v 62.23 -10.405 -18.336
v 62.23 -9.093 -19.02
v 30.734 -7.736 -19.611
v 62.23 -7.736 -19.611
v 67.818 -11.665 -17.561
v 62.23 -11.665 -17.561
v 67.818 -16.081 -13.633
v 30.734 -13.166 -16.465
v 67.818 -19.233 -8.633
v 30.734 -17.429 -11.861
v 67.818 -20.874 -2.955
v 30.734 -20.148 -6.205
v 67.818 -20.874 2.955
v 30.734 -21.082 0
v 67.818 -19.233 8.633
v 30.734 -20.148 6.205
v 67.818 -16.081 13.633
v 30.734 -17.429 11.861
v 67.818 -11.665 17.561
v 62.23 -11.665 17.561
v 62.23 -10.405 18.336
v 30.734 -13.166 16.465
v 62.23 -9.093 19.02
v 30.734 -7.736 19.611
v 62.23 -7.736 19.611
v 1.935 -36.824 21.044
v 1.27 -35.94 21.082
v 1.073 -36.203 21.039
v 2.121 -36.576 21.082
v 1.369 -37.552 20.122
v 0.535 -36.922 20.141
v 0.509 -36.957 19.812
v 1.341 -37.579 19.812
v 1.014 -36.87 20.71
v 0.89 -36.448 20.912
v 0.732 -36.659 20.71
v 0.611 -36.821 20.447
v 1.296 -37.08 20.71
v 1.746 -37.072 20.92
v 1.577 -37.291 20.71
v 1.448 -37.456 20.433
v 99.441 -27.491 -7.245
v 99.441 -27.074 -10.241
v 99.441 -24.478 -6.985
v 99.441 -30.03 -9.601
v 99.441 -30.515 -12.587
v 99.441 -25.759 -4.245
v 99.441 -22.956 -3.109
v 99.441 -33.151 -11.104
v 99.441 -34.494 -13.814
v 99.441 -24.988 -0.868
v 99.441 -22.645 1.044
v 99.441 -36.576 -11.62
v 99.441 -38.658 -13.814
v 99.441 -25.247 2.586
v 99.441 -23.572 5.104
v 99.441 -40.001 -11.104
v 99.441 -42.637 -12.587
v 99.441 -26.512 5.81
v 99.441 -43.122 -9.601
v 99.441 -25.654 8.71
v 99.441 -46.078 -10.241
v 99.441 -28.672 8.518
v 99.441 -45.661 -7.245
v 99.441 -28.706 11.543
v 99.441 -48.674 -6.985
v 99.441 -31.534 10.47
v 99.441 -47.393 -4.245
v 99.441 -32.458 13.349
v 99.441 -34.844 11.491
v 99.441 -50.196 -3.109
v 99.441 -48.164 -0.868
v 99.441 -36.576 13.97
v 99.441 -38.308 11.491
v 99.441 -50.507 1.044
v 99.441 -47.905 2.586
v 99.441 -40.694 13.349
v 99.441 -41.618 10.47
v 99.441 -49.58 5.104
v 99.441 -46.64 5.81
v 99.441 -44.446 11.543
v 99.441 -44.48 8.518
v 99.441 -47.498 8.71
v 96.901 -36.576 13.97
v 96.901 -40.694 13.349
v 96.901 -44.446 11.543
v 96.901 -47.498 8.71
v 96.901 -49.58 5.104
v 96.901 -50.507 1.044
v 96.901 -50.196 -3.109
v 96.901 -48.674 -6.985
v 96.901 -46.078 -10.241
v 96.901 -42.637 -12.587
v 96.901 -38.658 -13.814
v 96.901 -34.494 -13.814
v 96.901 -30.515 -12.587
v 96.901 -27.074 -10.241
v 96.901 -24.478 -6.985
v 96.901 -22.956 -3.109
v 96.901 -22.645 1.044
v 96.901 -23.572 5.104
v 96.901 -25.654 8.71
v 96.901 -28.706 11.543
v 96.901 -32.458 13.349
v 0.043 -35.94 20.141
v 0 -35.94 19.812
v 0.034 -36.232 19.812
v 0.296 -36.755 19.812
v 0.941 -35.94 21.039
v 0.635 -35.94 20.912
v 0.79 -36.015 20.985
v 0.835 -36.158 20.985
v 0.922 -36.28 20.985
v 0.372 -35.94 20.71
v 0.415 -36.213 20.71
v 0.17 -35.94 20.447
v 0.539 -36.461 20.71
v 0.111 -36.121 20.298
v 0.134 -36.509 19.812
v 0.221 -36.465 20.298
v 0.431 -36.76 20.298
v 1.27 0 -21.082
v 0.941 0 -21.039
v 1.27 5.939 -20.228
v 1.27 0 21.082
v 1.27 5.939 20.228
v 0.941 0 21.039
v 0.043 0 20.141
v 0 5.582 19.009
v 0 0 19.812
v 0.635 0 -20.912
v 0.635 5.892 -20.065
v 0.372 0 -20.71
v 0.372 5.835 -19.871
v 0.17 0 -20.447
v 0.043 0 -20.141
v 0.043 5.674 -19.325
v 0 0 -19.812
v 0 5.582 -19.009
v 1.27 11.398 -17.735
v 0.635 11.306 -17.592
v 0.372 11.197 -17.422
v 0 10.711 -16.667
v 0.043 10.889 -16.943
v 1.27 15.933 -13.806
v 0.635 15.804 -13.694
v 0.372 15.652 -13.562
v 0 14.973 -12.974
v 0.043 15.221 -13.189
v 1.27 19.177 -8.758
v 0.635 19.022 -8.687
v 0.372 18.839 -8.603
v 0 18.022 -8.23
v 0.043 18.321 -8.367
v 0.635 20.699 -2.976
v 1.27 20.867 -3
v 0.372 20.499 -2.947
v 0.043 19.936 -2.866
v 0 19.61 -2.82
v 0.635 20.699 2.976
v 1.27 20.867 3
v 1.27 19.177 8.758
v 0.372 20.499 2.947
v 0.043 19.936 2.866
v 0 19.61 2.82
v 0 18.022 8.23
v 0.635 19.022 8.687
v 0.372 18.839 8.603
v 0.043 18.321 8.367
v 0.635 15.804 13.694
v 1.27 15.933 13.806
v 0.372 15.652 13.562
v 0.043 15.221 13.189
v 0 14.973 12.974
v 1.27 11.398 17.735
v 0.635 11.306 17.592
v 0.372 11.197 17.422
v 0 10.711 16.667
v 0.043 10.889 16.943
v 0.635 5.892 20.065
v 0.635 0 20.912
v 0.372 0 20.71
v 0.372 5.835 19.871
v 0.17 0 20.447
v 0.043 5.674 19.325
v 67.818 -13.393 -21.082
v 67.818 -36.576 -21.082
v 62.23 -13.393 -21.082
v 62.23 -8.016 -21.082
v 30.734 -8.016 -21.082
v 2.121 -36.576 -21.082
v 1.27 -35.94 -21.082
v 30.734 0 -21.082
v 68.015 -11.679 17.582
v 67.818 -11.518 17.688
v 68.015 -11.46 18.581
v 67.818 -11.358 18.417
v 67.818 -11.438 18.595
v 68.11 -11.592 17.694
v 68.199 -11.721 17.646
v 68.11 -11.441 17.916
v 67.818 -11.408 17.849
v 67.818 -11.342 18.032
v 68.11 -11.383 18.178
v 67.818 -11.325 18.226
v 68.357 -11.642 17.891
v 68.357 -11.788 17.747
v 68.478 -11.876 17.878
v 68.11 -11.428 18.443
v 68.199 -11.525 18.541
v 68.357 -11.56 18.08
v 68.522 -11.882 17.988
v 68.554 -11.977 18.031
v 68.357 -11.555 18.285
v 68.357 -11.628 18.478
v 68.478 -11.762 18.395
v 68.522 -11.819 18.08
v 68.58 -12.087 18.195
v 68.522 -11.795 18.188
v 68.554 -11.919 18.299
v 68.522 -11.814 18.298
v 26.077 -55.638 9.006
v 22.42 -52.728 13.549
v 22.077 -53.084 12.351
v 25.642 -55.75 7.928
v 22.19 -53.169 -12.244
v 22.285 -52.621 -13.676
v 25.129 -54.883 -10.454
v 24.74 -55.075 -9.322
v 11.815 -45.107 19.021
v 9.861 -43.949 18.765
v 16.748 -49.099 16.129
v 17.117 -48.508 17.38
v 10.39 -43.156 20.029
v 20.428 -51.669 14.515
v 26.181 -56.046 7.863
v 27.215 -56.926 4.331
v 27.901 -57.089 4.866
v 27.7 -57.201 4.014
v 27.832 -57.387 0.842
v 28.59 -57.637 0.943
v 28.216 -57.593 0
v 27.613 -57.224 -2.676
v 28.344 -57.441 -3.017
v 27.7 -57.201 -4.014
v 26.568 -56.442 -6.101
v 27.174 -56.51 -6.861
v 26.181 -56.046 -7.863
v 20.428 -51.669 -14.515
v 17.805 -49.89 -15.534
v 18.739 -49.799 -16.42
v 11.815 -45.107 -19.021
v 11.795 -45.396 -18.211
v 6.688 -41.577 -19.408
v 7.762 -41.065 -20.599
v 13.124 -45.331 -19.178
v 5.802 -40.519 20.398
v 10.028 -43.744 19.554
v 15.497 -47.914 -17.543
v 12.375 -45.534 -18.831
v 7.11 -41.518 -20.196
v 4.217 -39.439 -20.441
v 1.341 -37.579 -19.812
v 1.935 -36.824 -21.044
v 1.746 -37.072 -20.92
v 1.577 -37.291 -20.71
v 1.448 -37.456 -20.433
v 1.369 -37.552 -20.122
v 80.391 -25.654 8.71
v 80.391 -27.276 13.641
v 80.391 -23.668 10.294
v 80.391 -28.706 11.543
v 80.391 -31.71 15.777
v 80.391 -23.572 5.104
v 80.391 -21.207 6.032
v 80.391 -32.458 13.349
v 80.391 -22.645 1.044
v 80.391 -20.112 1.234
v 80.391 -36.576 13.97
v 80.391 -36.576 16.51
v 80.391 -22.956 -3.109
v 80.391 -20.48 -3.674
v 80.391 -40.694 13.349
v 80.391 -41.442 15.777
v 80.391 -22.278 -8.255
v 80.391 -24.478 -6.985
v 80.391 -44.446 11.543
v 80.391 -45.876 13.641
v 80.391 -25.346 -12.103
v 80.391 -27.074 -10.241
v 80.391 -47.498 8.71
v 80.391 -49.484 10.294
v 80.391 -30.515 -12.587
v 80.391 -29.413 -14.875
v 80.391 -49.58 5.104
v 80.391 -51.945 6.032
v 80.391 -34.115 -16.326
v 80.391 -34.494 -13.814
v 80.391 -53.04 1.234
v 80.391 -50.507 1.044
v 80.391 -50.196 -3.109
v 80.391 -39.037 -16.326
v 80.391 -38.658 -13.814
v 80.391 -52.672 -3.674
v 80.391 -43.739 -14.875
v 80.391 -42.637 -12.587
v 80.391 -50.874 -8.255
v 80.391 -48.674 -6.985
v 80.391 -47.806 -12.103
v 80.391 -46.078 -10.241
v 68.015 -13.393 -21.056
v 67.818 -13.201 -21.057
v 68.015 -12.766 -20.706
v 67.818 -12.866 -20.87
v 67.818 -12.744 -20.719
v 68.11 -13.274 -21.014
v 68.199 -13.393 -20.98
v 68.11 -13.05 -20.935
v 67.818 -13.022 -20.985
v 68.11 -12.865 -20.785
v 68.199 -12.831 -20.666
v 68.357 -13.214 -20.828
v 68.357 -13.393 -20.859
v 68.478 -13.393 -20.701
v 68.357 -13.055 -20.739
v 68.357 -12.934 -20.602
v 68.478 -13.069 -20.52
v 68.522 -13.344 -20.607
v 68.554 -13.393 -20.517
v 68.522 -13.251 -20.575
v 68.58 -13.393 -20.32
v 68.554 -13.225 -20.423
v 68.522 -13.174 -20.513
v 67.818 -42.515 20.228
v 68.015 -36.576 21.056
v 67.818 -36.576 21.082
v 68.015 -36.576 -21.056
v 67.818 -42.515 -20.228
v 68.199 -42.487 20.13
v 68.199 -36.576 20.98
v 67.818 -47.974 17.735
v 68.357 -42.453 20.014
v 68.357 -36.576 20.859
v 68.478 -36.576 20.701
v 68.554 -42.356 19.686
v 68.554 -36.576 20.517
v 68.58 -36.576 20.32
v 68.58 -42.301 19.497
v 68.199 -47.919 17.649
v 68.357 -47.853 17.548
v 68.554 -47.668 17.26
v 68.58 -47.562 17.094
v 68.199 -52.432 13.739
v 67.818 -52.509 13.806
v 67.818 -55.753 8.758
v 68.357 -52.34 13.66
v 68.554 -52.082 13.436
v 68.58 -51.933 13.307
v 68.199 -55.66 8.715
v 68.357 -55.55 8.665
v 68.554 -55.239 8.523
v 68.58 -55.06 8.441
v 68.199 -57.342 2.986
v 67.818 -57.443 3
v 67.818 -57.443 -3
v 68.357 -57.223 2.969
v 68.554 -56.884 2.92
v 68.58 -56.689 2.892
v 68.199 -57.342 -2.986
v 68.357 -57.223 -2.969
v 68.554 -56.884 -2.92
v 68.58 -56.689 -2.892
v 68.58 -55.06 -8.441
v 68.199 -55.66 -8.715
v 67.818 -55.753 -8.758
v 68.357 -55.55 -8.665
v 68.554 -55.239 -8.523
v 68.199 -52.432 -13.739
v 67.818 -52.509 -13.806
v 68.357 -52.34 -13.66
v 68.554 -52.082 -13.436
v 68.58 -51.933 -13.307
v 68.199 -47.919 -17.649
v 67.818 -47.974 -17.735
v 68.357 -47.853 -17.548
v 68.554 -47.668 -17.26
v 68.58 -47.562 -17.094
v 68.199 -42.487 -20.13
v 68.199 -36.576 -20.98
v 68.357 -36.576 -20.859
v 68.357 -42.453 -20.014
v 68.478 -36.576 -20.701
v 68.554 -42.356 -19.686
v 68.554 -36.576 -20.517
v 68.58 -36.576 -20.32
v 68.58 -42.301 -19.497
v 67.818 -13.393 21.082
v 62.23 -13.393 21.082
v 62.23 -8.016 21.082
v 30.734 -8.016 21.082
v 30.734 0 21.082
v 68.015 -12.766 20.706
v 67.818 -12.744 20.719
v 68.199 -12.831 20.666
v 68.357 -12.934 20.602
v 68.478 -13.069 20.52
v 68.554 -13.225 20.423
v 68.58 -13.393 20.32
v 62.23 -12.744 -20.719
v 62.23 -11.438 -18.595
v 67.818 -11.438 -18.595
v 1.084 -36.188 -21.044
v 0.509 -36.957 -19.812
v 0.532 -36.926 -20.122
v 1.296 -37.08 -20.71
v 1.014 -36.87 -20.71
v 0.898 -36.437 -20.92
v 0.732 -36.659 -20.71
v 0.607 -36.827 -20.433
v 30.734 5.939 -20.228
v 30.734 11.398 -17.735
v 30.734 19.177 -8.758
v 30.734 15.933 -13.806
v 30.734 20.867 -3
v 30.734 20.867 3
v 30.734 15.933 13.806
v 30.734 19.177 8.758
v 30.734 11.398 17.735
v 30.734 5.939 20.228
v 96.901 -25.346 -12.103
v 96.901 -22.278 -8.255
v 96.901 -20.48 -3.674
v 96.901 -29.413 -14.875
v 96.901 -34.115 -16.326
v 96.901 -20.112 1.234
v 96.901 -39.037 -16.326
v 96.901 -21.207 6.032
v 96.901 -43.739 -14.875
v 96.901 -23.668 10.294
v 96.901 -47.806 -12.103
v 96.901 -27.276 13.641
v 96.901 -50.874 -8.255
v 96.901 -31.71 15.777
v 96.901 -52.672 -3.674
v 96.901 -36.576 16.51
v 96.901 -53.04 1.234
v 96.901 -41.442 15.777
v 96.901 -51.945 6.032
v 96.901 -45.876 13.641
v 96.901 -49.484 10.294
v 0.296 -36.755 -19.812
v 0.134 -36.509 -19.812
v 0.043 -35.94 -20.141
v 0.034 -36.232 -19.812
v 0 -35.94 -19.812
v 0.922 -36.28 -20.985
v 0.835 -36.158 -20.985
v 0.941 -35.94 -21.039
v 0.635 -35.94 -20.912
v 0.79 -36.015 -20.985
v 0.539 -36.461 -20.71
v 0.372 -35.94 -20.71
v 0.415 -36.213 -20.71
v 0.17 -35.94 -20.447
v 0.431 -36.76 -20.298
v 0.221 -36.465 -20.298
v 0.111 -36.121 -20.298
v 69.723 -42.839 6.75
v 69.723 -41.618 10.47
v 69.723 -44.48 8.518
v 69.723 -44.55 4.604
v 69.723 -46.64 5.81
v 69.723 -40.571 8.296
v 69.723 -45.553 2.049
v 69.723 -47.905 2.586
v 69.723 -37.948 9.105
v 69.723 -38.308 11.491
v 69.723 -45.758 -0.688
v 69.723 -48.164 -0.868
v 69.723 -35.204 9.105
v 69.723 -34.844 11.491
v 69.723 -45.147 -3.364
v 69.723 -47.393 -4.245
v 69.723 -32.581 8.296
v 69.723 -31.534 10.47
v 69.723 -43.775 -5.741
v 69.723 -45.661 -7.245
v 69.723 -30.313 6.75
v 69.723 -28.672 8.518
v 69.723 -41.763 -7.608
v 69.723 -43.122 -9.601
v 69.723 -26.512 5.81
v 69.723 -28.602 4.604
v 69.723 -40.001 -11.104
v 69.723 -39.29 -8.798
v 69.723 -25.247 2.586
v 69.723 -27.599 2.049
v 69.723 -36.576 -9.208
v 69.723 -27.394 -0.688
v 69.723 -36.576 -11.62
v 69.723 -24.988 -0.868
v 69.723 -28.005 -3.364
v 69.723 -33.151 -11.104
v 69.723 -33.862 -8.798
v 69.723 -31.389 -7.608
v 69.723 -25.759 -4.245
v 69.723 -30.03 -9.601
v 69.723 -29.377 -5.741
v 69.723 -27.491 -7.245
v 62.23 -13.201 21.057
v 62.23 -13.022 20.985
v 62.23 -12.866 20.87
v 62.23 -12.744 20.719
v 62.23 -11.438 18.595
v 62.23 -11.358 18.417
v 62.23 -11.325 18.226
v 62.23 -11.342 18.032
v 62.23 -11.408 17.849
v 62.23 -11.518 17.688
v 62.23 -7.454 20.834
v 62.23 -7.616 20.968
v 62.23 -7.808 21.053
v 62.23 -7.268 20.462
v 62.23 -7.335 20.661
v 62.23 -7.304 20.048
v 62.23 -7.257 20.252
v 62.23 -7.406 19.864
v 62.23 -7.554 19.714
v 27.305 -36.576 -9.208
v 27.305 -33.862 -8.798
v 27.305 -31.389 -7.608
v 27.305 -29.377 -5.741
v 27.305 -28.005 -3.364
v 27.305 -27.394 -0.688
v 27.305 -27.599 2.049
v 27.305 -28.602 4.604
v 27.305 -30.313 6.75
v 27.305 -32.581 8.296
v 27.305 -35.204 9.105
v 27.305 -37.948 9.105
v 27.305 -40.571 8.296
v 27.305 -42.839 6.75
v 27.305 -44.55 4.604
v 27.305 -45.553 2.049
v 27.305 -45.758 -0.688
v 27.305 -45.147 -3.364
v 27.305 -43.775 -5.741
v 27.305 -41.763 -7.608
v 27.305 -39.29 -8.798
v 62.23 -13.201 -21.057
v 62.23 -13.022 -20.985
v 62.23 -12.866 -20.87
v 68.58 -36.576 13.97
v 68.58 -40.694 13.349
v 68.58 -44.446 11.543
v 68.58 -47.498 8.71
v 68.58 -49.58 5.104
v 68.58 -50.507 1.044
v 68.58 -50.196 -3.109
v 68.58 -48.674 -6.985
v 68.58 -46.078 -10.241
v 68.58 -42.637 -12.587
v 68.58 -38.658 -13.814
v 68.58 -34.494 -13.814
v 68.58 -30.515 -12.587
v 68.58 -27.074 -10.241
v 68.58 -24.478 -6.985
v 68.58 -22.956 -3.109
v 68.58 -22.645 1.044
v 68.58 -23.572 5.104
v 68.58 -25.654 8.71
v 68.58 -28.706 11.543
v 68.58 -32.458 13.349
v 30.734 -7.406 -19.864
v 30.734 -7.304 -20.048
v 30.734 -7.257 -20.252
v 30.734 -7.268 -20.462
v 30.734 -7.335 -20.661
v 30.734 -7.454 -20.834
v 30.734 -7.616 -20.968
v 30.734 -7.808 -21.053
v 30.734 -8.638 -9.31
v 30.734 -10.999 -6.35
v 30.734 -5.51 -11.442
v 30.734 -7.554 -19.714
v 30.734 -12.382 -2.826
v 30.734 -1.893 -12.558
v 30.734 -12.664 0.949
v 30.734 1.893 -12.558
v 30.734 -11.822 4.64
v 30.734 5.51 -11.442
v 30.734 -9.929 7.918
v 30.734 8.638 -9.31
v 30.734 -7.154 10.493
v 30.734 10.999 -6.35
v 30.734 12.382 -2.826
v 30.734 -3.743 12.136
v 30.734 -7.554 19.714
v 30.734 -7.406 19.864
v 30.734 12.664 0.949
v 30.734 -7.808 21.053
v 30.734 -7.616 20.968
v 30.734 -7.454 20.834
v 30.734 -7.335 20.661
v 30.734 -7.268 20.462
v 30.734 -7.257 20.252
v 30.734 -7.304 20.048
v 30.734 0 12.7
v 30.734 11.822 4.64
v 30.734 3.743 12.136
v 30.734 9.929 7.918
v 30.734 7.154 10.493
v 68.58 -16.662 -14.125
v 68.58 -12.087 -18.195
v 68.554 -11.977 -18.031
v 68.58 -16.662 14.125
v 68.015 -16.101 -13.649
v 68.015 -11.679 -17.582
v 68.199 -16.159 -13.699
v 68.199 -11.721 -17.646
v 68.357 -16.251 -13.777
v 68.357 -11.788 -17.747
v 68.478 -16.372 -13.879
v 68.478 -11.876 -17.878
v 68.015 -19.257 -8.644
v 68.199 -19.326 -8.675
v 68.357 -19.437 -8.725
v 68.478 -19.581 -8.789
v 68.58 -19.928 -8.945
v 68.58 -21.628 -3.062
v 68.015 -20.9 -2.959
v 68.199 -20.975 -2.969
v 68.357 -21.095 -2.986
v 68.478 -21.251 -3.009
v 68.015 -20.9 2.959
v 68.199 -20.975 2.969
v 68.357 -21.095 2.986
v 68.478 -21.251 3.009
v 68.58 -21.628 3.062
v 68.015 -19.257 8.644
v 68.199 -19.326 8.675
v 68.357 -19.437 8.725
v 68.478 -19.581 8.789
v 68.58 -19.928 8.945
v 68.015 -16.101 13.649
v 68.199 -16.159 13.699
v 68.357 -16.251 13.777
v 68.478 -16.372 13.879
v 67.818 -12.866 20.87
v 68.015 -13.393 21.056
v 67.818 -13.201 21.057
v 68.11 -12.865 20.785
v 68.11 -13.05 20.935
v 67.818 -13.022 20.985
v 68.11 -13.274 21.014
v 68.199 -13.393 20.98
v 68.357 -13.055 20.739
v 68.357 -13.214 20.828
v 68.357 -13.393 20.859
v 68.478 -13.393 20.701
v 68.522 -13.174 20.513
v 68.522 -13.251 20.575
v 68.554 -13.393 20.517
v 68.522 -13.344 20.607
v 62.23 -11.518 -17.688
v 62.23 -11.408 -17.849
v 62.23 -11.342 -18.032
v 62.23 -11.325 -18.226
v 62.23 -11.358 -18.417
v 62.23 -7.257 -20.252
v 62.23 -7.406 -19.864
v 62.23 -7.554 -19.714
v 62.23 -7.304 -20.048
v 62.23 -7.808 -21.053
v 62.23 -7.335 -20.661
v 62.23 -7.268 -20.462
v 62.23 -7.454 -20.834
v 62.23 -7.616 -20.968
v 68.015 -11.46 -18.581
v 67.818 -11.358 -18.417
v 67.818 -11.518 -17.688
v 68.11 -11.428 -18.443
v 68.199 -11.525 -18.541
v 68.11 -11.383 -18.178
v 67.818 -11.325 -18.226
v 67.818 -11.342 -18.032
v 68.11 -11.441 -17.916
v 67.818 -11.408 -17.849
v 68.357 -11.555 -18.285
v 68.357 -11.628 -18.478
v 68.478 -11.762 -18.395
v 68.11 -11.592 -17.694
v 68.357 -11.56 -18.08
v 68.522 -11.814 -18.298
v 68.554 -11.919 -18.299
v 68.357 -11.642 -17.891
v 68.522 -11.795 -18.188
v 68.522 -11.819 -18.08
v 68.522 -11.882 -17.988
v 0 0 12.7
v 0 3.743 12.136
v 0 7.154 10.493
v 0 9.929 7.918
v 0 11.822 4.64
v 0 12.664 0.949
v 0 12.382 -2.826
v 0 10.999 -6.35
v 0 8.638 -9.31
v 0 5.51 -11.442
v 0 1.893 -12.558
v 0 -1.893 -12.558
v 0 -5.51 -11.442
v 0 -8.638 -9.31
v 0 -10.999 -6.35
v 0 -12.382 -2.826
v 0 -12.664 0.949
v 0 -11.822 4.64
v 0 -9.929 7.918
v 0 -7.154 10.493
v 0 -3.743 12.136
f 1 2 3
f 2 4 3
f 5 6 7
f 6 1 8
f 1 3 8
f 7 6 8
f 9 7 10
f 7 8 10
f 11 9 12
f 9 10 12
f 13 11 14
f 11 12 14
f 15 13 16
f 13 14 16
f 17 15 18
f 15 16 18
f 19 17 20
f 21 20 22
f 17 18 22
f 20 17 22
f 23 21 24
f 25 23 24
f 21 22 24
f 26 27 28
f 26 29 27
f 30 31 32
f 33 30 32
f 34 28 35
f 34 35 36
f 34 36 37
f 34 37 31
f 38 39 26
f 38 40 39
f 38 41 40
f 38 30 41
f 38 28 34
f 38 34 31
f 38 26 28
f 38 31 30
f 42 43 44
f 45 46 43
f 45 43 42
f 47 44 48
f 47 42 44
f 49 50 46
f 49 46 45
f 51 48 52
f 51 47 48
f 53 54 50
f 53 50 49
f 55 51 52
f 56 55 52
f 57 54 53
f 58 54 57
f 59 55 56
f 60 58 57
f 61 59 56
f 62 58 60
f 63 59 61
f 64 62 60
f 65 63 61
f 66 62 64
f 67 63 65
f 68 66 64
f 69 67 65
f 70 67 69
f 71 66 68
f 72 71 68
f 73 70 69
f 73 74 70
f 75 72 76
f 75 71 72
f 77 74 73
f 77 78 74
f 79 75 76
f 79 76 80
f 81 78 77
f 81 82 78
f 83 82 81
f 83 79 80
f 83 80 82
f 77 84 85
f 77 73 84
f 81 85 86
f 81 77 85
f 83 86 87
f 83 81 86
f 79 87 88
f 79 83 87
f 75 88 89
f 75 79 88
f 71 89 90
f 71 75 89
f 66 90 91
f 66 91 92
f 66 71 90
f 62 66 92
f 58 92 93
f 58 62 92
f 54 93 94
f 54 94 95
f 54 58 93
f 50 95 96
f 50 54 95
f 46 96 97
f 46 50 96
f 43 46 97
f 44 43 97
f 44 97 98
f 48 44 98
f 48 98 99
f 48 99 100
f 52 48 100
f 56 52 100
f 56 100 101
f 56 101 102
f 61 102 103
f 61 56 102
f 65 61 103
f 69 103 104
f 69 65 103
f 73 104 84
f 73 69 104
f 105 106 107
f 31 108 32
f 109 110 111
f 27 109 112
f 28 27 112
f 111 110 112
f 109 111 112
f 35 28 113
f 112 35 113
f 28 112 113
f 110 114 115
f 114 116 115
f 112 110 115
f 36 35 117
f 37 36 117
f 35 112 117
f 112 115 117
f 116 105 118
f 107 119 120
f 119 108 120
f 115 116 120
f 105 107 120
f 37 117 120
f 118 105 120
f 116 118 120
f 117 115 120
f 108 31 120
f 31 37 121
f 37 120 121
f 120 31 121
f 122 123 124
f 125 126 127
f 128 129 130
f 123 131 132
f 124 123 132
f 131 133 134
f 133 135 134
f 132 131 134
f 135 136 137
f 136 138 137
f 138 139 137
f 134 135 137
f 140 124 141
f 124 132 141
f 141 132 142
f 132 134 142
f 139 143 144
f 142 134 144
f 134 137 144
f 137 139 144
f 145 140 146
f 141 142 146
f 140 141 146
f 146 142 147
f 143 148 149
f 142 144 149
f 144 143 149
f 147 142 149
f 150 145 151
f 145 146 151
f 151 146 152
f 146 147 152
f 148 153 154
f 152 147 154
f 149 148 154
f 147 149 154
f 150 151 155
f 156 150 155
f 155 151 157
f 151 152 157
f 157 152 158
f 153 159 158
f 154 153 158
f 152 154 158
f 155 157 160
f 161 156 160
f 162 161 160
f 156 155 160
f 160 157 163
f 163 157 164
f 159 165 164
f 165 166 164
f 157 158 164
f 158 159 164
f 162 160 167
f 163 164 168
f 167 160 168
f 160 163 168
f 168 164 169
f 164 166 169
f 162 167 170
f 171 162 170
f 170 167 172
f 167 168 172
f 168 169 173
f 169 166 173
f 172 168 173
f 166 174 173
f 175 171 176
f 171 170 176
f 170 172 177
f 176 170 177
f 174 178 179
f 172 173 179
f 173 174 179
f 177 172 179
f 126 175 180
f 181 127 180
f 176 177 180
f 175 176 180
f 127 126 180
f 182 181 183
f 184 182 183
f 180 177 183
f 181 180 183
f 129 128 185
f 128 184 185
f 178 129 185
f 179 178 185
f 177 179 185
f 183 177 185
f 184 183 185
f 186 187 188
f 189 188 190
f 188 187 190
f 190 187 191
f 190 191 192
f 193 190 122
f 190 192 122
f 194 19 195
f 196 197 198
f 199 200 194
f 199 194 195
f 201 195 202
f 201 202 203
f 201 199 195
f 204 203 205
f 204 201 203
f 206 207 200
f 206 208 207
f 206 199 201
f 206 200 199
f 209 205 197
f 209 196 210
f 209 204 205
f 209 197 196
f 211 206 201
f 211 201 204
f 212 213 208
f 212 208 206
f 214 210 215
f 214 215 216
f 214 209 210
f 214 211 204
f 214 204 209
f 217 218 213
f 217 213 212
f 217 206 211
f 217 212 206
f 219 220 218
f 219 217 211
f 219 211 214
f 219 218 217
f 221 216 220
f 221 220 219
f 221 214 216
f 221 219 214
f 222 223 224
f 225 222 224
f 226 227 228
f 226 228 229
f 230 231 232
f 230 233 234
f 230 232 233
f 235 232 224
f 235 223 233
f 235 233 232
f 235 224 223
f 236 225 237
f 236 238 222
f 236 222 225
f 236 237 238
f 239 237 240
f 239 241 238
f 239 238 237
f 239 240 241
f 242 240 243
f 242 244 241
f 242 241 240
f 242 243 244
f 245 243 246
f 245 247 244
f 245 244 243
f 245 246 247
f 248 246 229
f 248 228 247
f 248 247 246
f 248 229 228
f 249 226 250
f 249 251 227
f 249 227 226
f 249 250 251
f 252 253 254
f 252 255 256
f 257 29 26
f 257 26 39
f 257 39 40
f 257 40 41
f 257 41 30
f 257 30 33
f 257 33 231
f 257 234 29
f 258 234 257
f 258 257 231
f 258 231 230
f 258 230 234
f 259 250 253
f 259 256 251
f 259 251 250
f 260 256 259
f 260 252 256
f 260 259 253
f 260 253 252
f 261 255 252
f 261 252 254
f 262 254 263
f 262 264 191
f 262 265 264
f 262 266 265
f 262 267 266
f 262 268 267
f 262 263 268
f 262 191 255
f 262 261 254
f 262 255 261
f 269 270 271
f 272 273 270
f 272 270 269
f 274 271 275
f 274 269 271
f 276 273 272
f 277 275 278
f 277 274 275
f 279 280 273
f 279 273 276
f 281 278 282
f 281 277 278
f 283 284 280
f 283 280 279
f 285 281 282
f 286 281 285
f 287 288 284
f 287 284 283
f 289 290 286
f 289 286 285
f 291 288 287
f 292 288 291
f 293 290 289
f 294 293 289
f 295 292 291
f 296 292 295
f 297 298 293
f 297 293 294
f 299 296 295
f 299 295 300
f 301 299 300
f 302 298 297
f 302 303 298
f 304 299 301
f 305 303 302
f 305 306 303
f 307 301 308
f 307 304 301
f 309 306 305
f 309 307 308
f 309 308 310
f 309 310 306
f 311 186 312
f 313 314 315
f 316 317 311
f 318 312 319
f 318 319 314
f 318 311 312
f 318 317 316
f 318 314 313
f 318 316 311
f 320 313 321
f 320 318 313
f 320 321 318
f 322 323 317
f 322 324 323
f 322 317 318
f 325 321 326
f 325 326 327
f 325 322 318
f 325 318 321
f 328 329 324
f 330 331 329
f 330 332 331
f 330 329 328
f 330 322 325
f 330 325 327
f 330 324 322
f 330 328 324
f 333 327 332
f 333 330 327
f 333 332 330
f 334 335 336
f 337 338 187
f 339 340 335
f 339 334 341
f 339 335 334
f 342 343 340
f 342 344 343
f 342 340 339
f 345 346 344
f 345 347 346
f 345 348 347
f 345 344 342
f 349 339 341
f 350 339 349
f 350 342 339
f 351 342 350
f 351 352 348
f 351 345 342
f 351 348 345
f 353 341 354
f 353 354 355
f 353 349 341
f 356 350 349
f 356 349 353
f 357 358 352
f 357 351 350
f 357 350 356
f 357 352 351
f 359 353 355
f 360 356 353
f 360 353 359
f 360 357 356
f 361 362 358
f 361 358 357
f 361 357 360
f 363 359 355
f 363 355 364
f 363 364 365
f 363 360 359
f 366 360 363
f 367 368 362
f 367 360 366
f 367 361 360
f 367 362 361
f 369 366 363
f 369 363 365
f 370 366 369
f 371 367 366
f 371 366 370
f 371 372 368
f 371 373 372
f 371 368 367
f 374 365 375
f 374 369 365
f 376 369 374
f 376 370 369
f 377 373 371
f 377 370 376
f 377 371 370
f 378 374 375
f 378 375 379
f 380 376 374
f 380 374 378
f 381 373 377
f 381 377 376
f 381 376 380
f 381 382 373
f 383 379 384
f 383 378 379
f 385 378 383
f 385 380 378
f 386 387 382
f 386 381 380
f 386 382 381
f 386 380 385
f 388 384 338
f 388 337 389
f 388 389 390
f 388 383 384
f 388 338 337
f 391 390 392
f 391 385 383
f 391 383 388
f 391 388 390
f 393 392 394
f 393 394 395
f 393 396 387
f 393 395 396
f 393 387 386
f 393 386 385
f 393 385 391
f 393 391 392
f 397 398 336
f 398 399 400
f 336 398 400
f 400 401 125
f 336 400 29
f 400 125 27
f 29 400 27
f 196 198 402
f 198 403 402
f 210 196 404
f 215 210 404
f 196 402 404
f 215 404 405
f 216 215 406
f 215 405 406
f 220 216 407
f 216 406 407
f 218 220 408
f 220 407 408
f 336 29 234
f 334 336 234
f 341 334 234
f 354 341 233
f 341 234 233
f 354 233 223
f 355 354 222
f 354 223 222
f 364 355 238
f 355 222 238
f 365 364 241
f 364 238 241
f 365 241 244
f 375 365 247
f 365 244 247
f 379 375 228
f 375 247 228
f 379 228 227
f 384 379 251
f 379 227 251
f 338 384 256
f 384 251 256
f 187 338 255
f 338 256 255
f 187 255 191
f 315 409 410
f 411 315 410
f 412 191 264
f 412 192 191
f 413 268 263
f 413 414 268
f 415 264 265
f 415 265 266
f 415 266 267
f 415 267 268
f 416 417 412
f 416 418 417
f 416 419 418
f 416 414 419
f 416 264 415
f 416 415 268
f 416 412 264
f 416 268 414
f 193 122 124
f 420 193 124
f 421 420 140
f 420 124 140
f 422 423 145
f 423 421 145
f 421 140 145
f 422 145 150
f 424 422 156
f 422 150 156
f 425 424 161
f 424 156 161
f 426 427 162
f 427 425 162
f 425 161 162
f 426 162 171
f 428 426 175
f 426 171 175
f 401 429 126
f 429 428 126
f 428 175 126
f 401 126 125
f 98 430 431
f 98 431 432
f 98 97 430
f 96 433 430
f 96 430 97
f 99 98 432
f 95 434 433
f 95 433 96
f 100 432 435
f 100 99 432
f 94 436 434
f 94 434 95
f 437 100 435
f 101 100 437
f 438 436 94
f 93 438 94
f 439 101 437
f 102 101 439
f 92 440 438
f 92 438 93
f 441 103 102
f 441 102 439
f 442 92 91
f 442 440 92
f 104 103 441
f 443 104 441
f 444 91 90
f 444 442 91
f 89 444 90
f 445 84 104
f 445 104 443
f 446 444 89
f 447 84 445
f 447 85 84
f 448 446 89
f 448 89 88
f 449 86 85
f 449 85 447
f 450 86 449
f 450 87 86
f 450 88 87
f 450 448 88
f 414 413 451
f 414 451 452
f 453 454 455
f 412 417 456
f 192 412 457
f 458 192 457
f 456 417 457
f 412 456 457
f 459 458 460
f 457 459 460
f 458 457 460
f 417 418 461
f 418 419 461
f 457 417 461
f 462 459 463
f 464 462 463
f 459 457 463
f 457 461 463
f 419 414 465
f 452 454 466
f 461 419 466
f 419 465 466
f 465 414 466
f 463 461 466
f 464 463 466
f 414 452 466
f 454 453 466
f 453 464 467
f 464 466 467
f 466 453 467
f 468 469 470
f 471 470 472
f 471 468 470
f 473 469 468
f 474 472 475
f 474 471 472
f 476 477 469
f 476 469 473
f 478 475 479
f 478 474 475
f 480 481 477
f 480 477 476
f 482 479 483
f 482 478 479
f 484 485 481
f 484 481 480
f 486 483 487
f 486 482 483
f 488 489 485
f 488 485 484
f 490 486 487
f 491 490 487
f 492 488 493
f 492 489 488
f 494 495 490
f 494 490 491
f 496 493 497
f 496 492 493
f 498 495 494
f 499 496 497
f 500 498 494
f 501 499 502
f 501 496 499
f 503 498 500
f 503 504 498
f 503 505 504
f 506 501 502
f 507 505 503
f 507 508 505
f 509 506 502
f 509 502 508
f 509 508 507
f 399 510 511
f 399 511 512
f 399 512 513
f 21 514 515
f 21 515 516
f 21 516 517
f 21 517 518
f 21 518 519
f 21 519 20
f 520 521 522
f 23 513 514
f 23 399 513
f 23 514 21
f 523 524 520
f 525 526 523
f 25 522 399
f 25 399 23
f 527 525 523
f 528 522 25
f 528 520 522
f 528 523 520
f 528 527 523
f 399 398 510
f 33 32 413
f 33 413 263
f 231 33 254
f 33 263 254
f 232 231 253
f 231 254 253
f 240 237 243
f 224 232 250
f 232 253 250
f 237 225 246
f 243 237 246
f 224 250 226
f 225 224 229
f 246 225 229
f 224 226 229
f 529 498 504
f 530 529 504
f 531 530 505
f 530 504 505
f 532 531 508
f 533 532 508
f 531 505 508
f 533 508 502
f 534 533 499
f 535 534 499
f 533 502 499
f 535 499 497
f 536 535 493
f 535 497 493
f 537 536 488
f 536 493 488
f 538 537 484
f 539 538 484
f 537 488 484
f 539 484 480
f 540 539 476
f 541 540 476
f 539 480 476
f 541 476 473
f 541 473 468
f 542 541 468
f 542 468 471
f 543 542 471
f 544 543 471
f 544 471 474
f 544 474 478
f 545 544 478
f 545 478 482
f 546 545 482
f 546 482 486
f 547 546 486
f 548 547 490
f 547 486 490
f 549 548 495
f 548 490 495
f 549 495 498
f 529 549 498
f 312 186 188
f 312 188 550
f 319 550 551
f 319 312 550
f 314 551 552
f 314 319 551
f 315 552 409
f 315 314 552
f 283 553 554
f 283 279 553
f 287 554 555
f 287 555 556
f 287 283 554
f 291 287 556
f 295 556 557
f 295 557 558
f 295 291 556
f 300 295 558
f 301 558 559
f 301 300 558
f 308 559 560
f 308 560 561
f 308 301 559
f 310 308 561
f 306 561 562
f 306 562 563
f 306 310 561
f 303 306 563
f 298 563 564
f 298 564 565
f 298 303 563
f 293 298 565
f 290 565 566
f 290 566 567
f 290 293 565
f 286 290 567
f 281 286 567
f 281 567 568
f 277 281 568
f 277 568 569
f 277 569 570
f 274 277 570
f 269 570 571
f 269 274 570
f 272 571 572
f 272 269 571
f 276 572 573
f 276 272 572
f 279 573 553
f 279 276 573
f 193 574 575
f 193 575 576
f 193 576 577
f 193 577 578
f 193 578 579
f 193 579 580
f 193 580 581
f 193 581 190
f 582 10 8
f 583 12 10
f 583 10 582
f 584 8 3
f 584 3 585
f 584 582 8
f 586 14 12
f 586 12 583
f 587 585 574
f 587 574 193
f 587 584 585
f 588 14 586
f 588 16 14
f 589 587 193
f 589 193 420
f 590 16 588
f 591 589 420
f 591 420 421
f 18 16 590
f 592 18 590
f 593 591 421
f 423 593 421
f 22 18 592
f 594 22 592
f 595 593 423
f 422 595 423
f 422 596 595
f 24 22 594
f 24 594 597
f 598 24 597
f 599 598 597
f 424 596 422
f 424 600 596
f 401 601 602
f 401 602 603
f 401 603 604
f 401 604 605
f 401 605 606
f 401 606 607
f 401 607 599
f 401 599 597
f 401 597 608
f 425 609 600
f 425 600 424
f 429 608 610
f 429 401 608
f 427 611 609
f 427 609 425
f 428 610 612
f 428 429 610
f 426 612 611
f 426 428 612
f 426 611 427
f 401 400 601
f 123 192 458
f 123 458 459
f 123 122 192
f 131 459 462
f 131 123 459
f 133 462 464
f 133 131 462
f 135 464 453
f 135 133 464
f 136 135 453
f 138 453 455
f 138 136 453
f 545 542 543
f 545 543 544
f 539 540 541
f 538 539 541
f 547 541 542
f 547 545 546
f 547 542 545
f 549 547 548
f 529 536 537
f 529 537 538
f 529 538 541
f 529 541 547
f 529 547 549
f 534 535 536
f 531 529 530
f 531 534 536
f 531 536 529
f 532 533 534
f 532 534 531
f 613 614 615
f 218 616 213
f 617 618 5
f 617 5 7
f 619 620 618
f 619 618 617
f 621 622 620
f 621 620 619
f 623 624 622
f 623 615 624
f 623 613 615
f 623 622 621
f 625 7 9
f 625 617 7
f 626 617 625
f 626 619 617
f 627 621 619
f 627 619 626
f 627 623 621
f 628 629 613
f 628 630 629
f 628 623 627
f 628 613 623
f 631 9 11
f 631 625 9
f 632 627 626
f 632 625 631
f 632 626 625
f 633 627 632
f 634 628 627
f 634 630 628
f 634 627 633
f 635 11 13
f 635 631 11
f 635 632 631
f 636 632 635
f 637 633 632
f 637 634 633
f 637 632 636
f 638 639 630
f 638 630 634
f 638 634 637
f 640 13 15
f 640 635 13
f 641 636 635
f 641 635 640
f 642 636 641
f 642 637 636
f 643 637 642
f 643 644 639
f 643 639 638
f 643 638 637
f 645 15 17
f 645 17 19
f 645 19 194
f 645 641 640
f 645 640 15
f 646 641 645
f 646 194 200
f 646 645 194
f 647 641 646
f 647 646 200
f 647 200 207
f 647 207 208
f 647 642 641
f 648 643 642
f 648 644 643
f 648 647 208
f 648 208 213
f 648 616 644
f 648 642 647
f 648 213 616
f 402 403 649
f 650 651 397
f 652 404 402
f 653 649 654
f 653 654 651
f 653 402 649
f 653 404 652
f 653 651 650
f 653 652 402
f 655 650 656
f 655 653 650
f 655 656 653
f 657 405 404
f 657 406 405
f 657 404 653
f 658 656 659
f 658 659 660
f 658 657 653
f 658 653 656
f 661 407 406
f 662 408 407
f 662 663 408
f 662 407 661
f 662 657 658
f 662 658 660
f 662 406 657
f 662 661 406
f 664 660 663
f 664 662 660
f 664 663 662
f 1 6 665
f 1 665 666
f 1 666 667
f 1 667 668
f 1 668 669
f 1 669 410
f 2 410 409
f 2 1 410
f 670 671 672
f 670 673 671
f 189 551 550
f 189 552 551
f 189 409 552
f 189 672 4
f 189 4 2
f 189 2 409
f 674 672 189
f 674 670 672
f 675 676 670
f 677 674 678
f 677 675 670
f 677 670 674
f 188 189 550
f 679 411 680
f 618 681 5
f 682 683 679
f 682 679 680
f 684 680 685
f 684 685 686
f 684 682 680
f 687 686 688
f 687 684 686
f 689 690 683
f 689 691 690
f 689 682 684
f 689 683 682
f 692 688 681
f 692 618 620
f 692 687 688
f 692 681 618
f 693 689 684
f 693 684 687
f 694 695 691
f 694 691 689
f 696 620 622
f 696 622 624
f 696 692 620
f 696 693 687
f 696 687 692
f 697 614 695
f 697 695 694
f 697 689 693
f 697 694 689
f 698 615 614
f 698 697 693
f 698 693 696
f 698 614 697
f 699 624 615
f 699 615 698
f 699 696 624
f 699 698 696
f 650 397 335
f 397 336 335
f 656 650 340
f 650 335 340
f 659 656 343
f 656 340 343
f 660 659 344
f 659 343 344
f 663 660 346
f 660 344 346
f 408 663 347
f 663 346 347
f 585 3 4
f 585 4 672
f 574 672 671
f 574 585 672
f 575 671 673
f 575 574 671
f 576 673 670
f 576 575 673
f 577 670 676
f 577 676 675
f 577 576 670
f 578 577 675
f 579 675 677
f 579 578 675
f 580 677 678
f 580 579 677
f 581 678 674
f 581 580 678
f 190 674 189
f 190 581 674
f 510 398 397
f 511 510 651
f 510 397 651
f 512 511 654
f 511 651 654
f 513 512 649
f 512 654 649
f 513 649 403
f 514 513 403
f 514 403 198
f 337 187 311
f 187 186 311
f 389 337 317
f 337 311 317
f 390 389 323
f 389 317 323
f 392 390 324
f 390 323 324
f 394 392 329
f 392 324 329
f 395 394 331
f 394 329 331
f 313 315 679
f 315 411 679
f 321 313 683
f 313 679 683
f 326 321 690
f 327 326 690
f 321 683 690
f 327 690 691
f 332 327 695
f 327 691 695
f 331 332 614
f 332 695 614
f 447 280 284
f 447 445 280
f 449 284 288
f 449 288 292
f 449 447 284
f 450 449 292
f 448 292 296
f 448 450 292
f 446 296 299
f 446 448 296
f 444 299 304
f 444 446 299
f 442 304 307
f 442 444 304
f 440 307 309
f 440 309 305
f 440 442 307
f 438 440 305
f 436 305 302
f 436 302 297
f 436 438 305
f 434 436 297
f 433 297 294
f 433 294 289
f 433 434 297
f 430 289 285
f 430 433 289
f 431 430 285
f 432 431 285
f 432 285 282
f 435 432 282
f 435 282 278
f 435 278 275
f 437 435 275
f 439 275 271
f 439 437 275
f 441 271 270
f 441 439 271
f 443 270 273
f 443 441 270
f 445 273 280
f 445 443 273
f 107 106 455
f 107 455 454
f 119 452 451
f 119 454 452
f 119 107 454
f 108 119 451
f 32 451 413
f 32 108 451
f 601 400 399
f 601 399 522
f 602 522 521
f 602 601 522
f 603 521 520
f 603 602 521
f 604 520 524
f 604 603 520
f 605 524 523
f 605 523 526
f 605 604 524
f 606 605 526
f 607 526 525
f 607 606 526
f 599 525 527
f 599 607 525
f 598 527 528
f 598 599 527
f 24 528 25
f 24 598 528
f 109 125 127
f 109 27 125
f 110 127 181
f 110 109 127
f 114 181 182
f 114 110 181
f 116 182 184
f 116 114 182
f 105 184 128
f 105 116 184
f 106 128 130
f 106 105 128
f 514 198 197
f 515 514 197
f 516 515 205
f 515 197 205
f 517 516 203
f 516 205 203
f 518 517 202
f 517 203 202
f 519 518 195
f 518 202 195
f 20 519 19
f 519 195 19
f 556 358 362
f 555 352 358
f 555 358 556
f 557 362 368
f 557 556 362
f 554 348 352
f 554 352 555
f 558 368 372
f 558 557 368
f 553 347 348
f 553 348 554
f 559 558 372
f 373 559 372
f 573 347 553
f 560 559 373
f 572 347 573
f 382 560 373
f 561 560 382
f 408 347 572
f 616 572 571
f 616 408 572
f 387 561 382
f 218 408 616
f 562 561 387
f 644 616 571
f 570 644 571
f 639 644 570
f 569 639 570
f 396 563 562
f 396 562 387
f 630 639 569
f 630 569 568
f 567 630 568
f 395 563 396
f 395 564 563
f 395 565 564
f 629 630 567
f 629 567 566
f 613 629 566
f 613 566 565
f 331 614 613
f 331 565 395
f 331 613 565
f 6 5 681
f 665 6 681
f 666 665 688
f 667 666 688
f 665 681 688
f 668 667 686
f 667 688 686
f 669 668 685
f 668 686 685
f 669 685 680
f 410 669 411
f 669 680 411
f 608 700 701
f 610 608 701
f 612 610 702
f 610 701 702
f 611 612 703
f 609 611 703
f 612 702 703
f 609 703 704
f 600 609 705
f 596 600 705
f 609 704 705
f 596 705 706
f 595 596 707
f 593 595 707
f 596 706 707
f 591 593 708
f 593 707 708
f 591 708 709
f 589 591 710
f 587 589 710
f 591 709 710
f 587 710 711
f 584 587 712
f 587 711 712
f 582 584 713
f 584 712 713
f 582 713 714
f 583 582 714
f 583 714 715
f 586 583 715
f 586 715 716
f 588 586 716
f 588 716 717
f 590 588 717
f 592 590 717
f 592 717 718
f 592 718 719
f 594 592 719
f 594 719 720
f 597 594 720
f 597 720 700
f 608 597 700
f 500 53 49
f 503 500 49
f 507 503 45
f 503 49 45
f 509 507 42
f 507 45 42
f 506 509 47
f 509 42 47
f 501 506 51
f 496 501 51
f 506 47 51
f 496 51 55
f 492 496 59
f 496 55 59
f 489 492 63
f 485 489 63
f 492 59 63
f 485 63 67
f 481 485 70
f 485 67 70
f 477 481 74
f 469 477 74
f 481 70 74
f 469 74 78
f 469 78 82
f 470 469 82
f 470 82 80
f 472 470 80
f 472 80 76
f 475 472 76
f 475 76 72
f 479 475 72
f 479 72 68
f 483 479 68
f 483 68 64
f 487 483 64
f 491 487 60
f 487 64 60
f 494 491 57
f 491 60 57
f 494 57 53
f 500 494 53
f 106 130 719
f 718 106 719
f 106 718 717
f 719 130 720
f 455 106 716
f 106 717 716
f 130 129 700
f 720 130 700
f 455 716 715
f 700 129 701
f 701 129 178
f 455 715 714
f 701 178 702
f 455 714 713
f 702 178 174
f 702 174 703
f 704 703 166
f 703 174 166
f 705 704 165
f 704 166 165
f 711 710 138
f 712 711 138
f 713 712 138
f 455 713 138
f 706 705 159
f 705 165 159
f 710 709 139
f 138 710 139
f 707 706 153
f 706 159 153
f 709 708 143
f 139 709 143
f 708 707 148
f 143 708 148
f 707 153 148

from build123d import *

# Parameters (mm, degrees)
BOSS_EXTRUDE1_DEPTH     = 68.58
CUT_EXTRUDE1_START      = -6.35
SKETCH2_R               = 21.082
CUT_EXTRUDE1_DEPTH      = 6.35
CUT_EXTRUDE2_START      = -6.35
CUT_EXTRUDE2_DEPTH      = 6.35
CUT_EXTRUDE3_DEPTH      = 93.044076876
CUT_EXTRUDE3_DEPTH_BACK = 93.044076876
FILLET1_R               = 1.27
CUT_EXTRUDE6_START      = 31.496
SKETCH8_R               = 21.082
CUT_EXTRUDE6_DEPTH      = 31.496
SKETCH9_R               = 12.7
CUT_EXTRUDE7_DEPTH      = 117.864914259
FILLET7_R               = 1.27
FILLET8_START           = 30.734
FILLET8_DEPTH           = 31.496
FILLET9_R               = 0.762
FILLET10_R              = 0.762
SKETCH10_R              = 11.6205
CUT_EXTRUDE8_DEPTH      = 29.718
SKETCH11_R              = 9.2075
CUT_EXTRUDE9_DEPTH      = 42.418


with BuildPart() as part:
    # Sketch1 → Boss-Extrude1 (new body)
    with BuildSketch(Plane(origin=(0, 0, 0), x_dir=(0, 0, -1), z_dir=(1, 0, 0))):
        with BuildLine():
            Line((-21.082, 0), (-21.082, -36.576))
            ThreePointArc((-21.082, -36.576), (0, -57.658), (21.082, -36.576))
            Line((21.082, -36.576), (21.082, 0))
            ThreePointArc((21.082, 0), (0, 21.082), (-21.082, 0))
        make_face()
    extrude(amount=BOSS_EXTRUDE1_DEPTH)

    # Sketch2 → Cut-Extrude1 (cut)
    with BuildSketch(Plane(origin=(68.58, 0, 0), x_dir=(0, 0, -1), z_dir=(1, 0, 0)).offset(CUT_EXTRUDE1_START)):
        Circle(SKETCH2_R)
    extrude(amount=CUT_EXTRUDE1_DEPTH, mode=Mode.SUBTRACT)

    # Sketch3 → Cut-Extrude2 (cut)
    with BuildSketch(Plane(origin=(68.58, 0, 0), x_dir=(0, 0, -1), z_dir=(1, 0, 0)).offset(CUT_EXTRUDE2_START)):
        with BuildLine():
            Line((-21.082, 0), (-21.082, -12.967513736))
            Line((-21.082, -12.967513736), (-17.956950774, -11.045299584))
            ThreePointArc((-17.956950774, -11.045299584), (-20.285698906, -5.739437593), (-21.082, 0))
        make_face()
    cut_extrude2 = extrude(amount=CUT_EXTRUDE2_DEPTH, mode=Mode.SUBTRACT)

    # Mirror2: Cut-Extrude2 across plane
    add(cut_extrude2.mirror(Plane.XY), mode=Mode.SUBTRACT)

    # Sketch4 → Cut-Extrude3 (cut, two sides: drawn at the far end of the back side and taken through both)
    with BuildSketch(Plane.XY.offset(-CUT_EXTRUDE3_DEPTH_BACK)):
        Polygon((0, -36.576), (28.194, -57.658), (0, -57.658), align=None)
    extrude(amount=CUT_EXTRUDE3_DEPTH + CUT_EXTRUDE3_DEPTH_BACK, mode=Mode.SUBTRACT)

    # Sketch5 → Revolve1 (revolve)
    with BuildSketch(Plane.XY, mode=Mode.PRIVATE) as revolve1_sk:
        Polygon((68.58, -50.546), (80.391, -50.546), (80.391, -53.086), (96.901, -53.086), (96.901, -50.546), (99.441, -50.546), (99.441, -36.576), (68.58, -36.576), align=None)
    revolve(revolve1_sk.sketch.rotate(Axis((68.58, -36.576, 0), (1, 0, 0)), 270), axis=Axis((68.58, -36.576, 0), (1, 0, 0)))

    # Fillet1
    fillet1_edges = [part.edges().sort_by_distance(p)[0] for p in [
        (0, -36.576, 0),
    ]]
    fillet(fillet1_edges, radius=FILLET1_R)

    # Sketch8 → Cut-Extrude6 (cut)
    with BuildSketch(Plane.ZY.offset(-62.23).offset(CUT_EXTRUDE6_START)):
        Circle(SKETCH8_R)
    extrude(amount=-CUT_EXTRUDE6_DEPTH, mode=Mode.SUBTRACT)

    # Sketch9 → Cut-Extrude7 (cut, through all)
    with BuildSketch(Plane.ZY):
        Circle(SKETCH9_R)
    extrude(amount=-CUT_EXTRUDE7_DEPTH, mode=Mode.SUBTRACT)

    # Fillet7
    fillet7_edges = [part.edges().sort_by_distance(p)[0] for p in [
        (0, -17.969927102, 21.082),
        (0, 21.082, 0),
        (0, -17.969927102, -21.082),
        (0.043445634, -36.269193524, 21.082),
        (17.697322345, -49.809132924, 16.411426416),
        (0.320832952, -36.783644414, -21.080977392),
        (0.320832952, -36.783644414, 21.080977392),
        (0.043445634, -36.269193524, -21.082),
    ]]
    fillet(fillet7_edges, radius=FILLET7_R)

    # Fillet8: read off the stored shape, not the designer's step
    # Fillet8 outline → Fillet8 (cut)
    with BuildSketch(Plane.YZ.offset(FILLET8_START)):
        with BuildLine():
            ThreePointArc((-8.01610479, 21.082), (-7.267513461, 20.462320144), (-7.736473227, 19.611162791))
            ThreePointArc((-7.736473227, 19.611162791), (-3.937523971, 20.711026749), (0, 21.082))
            Line((0, 21.082), (-8.01610479, 21.082))
        make_face()
        with BuildLine():
            ThreePointArc((-7.736473227, -19.611162791), (-7.267513461, -20.462320144), (-8.01610479, -21.082))
            Line((-8.01610479, -21.082), (0, -21.082))
            ThreePointArc((0, -21.082), (-3.937523971, -20.711026749), (-7.736473227, -19.611162791))
        make_face()
    extrude(amount=FILLET8_DEPTH, mode=Mode.SUBTRACT)

    # Fillet9
    fillet9_edges = [part.edges().sort_by_distance(p)[0] for p in [
        (65.405, -11.045299584, 17.956950774),
        (65.405, -12.967513736, 21.082),
        (65.405, -12.967513736, -21.082),
        (65.405, -11.045299584, -17.956950774),
    ]]
    fillet(fillet9_edges, radius=FILLET9_R)

    # Fillet10
    fillet10_edges = [part.edges().sort_by_distance(p)[0] for p in [
        (68.58, -57.658, 0),
        (68.58, -24.984709663, -21.082),
        (68.58, -12.090967399, -19.65695043),
        (68.58, -21.082, 0),
        (68.58, -12.090967399, 19.65695043),
        (68.58, -24.984709663, 21.082),
        (68.58, -13.021644868, 20.985152428),
        (68.58, -11.342397813, 18.031754442),
        (68.58, -11.342397813, -18.031754442),
        (68.58, -13.021644868, -20.985152428),
    ]]
    fillet(fillet10_edges, radius=FILLET10_R)

    # Sketch10 → Cut-Extrude8 (cut)
    with BuildSketch(Plane(origin=(99.441, 0, 0), x_dir=(0, 0, -1), z_dir=(1, 0, 0))):
        with Locations((0, -36.576)):
            Circle(SKETCH10_R)
    extrude(amount=-CUT_EXTRUDE8_DEPTH, mode=Mode.SUBTRACT)

    # Sketch11 → Cut-Extrude9 (cut)
    with BuildSketch(Plane(origin=(69.723, 0, 0), x_dir=(0, 0, -1), z_dir=(1, 0, 0))):
        with Locations((0, -36.576)):
            Circle(SKETCH11_R)
    extrude(amount=-CUT_EXTRUDE9_DEPTH, mode=Mode.SUBTRACT)


solid = part.part
